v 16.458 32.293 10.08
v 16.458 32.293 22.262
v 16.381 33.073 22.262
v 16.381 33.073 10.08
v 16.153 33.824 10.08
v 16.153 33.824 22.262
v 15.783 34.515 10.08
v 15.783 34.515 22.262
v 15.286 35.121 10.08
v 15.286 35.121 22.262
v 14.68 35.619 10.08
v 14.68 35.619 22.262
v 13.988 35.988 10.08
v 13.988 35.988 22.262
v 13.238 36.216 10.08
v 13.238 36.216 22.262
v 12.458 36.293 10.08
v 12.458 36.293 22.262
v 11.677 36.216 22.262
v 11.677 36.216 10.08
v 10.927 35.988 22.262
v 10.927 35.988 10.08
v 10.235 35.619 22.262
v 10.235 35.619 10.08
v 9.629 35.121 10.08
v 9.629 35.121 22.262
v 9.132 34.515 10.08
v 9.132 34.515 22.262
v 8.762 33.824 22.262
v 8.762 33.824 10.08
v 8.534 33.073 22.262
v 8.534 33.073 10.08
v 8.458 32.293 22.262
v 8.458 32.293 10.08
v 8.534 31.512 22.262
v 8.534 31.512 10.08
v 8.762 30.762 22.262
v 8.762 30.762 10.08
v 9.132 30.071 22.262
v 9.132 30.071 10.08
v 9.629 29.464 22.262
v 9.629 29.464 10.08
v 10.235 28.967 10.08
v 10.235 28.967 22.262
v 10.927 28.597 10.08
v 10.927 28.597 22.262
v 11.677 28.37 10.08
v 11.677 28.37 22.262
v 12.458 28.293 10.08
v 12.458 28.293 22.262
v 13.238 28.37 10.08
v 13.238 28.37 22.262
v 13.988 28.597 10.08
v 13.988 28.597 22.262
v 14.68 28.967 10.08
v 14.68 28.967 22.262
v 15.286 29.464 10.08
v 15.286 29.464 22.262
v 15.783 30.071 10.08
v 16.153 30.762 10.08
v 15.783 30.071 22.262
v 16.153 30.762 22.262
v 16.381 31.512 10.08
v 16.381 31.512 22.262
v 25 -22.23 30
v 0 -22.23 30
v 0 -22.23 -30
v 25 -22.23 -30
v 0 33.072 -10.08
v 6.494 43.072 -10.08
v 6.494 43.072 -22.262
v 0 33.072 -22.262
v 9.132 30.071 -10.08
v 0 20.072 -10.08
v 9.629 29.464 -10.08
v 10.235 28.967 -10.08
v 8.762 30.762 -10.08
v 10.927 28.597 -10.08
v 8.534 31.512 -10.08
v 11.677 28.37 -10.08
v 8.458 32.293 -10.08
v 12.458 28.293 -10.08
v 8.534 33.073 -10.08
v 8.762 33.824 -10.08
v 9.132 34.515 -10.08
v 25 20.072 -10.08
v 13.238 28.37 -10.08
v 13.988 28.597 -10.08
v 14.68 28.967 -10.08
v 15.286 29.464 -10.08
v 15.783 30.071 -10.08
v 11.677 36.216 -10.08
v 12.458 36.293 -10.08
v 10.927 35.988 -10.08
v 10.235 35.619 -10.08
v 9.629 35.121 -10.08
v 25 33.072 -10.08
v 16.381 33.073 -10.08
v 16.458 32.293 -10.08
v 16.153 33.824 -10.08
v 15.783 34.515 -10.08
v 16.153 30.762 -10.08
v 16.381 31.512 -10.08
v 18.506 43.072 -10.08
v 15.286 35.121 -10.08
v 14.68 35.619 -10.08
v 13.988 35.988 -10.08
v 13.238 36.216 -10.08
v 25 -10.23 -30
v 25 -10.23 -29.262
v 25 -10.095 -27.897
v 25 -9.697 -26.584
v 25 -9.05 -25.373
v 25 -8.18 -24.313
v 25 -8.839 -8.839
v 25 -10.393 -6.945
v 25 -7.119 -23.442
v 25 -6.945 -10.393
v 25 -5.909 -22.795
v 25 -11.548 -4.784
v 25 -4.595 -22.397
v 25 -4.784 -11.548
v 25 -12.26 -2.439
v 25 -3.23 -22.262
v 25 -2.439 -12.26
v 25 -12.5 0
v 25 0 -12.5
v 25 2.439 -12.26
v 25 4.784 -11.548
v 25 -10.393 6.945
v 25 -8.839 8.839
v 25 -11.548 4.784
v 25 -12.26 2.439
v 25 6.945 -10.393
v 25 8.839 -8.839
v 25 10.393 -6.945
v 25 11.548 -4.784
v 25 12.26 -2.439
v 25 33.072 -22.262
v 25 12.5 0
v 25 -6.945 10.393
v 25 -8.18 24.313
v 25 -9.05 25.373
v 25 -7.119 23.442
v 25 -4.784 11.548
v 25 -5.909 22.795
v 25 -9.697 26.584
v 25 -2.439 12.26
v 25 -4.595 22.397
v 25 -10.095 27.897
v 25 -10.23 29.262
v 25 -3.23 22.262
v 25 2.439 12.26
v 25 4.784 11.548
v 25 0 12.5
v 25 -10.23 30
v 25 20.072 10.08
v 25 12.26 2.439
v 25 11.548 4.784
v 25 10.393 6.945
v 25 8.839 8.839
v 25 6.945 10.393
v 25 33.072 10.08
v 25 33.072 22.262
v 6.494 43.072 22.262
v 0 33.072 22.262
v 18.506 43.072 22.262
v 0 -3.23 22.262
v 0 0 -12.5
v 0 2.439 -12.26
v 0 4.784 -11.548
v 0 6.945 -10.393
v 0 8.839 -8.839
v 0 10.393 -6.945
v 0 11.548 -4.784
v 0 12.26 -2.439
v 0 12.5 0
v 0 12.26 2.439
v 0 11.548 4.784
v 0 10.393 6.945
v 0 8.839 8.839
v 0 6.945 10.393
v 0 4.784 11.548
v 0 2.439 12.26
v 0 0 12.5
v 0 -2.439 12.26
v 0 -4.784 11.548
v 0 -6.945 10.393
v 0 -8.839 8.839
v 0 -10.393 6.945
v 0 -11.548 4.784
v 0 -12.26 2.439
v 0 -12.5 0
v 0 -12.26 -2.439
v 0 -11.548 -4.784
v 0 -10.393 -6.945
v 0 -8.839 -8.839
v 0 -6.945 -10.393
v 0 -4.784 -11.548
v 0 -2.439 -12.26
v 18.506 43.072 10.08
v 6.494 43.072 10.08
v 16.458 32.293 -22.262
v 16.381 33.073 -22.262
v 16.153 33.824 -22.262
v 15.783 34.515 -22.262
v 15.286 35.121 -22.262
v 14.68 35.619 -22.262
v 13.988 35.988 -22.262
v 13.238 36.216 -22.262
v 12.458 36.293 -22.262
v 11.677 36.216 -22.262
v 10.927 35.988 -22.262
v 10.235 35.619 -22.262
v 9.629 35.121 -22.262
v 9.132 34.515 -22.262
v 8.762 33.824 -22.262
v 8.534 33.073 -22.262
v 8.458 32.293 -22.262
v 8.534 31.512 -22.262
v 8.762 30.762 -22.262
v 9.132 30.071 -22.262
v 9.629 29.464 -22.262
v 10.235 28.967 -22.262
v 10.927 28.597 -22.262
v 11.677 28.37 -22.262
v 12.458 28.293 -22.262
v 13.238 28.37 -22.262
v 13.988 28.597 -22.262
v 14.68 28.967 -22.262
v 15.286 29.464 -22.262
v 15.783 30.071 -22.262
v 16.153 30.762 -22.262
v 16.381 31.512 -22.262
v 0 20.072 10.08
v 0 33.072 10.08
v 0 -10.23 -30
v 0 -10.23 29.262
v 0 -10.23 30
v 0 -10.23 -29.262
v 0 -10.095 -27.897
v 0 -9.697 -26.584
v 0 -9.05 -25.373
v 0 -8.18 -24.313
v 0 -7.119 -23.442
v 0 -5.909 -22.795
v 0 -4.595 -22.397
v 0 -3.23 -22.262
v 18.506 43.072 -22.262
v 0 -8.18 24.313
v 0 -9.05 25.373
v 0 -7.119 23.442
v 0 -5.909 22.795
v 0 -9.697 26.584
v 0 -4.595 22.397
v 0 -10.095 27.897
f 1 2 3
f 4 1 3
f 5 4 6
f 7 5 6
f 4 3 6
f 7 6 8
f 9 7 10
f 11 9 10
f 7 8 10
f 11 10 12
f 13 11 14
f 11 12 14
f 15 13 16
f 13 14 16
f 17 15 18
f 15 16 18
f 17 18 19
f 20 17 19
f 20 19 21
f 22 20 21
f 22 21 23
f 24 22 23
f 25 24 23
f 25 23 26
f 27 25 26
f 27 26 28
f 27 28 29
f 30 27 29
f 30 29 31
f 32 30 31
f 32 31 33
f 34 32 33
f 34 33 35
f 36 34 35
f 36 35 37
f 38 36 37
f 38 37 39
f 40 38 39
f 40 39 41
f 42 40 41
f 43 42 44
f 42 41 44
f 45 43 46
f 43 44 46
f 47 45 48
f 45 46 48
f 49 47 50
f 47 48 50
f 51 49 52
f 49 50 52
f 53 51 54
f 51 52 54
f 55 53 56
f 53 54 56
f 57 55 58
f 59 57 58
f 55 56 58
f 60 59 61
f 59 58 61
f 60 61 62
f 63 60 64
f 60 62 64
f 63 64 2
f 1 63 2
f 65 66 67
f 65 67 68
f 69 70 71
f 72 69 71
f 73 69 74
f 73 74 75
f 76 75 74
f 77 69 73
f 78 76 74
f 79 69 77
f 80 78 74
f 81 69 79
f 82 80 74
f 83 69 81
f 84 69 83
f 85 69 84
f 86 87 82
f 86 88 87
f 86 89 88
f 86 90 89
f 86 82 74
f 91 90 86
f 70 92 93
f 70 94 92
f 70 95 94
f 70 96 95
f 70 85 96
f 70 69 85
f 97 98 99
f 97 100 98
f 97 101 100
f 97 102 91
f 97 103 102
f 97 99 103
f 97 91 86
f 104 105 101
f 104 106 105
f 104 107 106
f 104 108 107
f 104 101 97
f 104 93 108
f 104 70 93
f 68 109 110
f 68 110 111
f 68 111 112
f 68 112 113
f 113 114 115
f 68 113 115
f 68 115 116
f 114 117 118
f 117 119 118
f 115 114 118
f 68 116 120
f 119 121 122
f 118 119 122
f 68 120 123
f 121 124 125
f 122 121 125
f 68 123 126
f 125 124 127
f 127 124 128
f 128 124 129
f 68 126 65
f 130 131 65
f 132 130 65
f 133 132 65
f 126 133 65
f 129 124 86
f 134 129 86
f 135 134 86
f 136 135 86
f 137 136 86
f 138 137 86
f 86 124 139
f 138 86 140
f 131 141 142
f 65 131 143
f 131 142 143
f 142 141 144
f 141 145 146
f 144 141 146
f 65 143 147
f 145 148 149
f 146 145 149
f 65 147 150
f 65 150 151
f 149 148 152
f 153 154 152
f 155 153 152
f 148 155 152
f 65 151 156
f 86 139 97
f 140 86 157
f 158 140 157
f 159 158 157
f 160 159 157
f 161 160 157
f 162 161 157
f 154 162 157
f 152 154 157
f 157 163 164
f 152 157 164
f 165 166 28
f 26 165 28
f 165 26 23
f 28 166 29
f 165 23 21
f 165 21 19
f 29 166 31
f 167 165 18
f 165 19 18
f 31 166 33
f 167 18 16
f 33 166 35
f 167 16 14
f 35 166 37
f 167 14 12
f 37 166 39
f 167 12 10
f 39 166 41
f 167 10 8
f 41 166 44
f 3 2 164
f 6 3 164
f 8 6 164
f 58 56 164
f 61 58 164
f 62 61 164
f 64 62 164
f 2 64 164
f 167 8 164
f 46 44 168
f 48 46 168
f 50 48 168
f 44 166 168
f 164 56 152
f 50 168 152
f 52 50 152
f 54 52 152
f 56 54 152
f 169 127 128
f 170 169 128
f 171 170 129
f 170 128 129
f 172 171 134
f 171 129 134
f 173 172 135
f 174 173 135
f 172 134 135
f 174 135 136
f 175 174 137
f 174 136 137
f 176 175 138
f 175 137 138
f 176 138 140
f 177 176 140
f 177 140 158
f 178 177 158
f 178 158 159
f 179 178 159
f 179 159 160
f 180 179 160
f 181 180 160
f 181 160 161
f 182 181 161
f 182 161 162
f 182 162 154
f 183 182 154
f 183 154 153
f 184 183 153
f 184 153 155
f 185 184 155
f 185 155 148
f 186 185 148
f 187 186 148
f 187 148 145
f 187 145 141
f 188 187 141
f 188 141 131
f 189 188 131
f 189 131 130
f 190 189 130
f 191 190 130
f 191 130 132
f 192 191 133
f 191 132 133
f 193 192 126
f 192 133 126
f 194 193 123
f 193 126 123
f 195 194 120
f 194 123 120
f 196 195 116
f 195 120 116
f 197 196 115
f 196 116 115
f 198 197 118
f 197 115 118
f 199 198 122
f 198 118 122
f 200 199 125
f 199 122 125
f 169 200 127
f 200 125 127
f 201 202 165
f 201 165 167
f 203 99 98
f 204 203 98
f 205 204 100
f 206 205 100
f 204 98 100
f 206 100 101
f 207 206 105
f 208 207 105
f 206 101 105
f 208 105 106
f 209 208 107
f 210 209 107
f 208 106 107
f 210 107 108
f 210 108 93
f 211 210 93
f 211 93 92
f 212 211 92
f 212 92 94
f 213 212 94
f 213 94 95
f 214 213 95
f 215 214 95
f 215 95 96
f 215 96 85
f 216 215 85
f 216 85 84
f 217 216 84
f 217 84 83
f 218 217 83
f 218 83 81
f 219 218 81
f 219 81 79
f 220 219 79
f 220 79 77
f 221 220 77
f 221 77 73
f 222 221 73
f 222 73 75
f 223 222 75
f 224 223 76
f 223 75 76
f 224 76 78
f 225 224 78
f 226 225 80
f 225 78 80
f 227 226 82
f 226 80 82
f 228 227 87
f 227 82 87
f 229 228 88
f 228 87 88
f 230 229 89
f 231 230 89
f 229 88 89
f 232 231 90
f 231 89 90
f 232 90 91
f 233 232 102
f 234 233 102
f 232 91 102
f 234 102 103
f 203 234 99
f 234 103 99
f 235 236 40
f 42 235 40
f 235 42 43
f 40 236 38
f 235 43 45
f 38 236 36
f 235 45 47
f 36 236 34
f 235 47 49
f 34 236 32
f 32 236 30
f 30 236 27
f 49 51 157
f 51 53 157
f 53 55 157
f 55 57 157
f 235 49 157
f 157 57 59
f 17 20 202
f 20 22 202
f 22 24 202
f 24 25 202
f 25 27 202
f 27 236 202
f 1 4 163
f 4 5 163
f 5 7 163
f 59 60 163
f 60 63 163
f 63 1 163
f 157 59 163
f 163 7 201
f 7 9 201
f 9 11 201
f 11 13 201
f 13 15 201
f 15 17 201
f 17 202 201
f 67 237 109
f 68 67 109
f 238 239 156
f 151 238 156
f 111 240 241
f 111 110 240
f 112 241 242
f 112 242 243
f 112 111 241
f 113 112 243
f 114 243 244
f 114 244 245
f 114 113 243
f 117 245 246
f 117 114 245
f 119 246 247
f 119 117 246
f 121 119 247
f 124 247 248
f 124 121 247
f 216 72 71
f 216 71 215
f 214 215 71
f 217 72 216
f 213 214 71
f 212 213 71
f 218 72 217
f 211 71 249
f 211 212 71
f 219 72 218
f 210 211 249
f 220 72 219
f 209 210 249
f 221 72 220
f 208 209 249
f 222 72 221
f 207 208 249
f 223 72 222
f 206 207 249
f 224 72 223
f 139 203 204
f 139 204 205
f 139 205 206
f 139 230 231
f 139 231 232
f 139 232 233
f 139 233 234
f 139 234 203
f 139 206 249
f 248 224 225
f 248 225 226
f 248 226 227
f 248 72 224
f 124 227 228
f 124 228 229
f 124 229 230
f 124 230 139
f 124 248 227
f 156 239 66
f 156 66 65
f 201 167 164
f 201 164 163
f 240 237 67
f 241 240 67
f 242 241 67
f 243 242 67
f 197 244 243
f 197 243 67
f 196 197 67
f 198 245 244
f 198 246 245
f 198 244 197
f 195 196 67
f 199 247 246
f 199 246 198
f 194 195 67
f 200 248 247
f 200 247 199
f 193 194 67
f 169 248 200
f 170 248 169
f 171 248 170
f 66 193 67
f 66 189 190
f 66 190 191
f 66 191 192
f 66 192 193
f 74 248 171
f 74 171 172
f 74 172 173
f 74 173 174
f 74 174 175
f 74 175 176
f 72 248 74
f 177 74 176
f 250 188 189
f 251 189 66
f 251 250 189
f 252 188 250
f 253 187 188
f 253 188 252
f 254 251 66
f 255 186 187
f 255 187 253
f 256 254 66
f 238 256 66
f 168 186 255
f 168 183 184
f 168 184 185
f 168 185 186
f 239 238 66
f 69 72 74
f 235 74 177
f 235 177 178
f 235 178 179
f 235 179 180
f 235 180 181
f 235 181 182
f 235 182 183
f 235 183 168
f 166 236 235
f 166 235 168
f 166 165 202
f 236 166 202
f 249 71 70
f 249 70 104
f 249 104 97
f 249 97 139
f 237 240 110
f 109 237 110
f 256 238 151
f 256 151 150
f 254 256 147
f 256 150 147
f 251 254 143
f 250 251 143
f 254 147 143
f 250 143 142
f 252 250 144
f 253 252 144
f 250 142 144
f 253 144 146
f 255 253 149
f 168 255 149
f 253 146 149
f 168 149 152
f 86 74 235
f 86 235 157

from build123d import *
from OCP.BRepFilletAPI import BRepFilletAPI_MakeChamfer

# Parameters (mm, degrees)
SKETCH_1_W          = 44.524667954
SKETCH_1_H          = 33.301696974
EXTRUDE_1_DEPTH     = 25
SKETCH_2_W          = 25
SKETCH_2_H          = 44.524667954
EXTRUDE_2_DEPTH     = 20
SKETCH_3_R          = 4
CUT_EXTRUDE_1_DEPTH = 67.802936569
SKETCH_4_W          = 57.585084074
SKETCH_4_H          = 20.16053609
CUT_EXTRUDE_2_DEPTH = 23
CHAMFER_2_SIZE      = 10
CHAMFER_2_SIZE2     = 6.494075932
SKETCH_5_W          = 25
SKETCH_5_H          = 60
EXTRUDE_3_DEPTH     = 12
FILLET_2_R          = 7
SKETCH_6_R          = 12.5
CUT_EXTRUDE_3_DEPTH = 59.13936943


with BuildPart() as part:
    # Эскиз1 → Вытянуть1 (new body)
    with BuildSketch(Plane(origin=(0, 0, 0), x_dir=(0, 0, -1), z_dir=(1, 0, 0))):
        with Locations((0, 6.421024908)):
            Rectangle(SKETCH_1_W, SKETCH_1_H)
    extrude(amount=EXTRUDE_1_DEPTH)

    # Эскиз2 → Вытянуть2 (add)
    with BuildSketch(Plane(origin=(0, 23.071873395, 0), x_dir=(1, 0, 0), z_dir=(0, 1, 0))):
        with Locations((12.5, 0)):
            Rectangle(SKETCH_2_W, SKETCH_2_H)
    extrude(amount=EXTRUDE_2_DEPTH)

    # Эскиз3 → Вырез-Вытянуть1 (cut, through all)
    with BuildSketch(Plane.XY.offset(22.262333977)):
        with Locations((12.457612309, 32.292854615)):
            Circle(SKETCH_3_R)
    extrude(amount=-CUT_EXTRUDE_1_DEPTH, mode=Mode.SUBTRACT)

    # Эскиз4 → Вырез-Вытянуть2 (cut)
    with BuildSketch(Plane(origin=(0, 43.071873395, 0), x_dir=(1, 0, 0), z_dir=(0, 1, 0))):
        Rectangle(SKETCH_4_W, SKETCH_4_H)
    extrude(amount=-CUT_EXTRUDE_2_DEPTH, mode=Mode.SUBTRACT)

    # Фаска2: one chamfer whose edges measure the first distance from different faces: ONE call of the kernel's chamfer builder (chamfer() names one face for all edges)
    chamfer_2_edges_1 = [part.edges().sort_by_distance(p)[0] for p in [
        (0, 43.071873395, -16.171301011),
        (0, 43.071873395, 16.171301011),
    ]]
    chamfer_2_side_1 = [part.faces().sort_by_distance(p)[0] for p in [
        (0, 12.741969901, 0),
    ]]
    chamfer_2_edges_2 = [part.edges().sort_by_distance(p)[0] for p in [
        (25, 43.071873395, 16.171301011),
        (25, 43.071873395, -16.171301011),
    ]]
    chamfer_2_side_2 = [part.faces().sort_by_distance(p)[0] for p in [
        (25, 12.741969901, 0),
    ]]
    chamfer_2 = BRepFilletAPI_MakeChamfer(part.part.solid().wrapped)
    for e in chamfer_2_edges_1:
        chamfer_2.Add(CHAMFER_2_SIZE, CHAMFER_2_SIZE2, e.wrapped, chamfer_2_side_1[0].wrapped)  # the first distance lies on this face
    for e in chamfer_2_edges_2:
        chamfer_2.Add(CHAMFER_2_SIZE, CHAMFER_2_SIZE2, e.wrapped, chamfer_2_side_2[0].wrapped)  # the first distance lies on this face
    add(Compound.cast(chamfer_2.Shape()), mode=Mode.REPLACE)

    # Эскиз5 → Вытянуть3 (add)
    with BuildSketch(Plane.XZ.offset(10.229823579)):
        with Locations((12.5, 0)):
            Rectangle(SKETCH_5_W, SKETCH_5_H)
    extrude(amount=EXTRUDE_3_DEPTH)

    # Скругление2
    fillet_2_edges = [part.edges().sort_by_distance(p)[0] for p in [
        (12.5, -10.229823579, -22.262333977),
        (12.5, -10.229823579, 22.262333977),
    ]]
    fillet(fillet_2_edges, radius=FILLET_2_R)

    # Эскиз6 → Вырез-Вытянуть3 (cut, through all)
    with BuildSketch(Plane(origin=(25, 0, 0), x_dir=(0, 0, -1), z_dir=(1, 0, 0))):
        with Locations((1.8e-08, 3.6e-08)):
            Circle(SKETCH_6_R)
    extrude(amount=-CUT_EXTRUDE_3_DEPTH, mode=Mode.SUBTRACT)


solid = part.part
